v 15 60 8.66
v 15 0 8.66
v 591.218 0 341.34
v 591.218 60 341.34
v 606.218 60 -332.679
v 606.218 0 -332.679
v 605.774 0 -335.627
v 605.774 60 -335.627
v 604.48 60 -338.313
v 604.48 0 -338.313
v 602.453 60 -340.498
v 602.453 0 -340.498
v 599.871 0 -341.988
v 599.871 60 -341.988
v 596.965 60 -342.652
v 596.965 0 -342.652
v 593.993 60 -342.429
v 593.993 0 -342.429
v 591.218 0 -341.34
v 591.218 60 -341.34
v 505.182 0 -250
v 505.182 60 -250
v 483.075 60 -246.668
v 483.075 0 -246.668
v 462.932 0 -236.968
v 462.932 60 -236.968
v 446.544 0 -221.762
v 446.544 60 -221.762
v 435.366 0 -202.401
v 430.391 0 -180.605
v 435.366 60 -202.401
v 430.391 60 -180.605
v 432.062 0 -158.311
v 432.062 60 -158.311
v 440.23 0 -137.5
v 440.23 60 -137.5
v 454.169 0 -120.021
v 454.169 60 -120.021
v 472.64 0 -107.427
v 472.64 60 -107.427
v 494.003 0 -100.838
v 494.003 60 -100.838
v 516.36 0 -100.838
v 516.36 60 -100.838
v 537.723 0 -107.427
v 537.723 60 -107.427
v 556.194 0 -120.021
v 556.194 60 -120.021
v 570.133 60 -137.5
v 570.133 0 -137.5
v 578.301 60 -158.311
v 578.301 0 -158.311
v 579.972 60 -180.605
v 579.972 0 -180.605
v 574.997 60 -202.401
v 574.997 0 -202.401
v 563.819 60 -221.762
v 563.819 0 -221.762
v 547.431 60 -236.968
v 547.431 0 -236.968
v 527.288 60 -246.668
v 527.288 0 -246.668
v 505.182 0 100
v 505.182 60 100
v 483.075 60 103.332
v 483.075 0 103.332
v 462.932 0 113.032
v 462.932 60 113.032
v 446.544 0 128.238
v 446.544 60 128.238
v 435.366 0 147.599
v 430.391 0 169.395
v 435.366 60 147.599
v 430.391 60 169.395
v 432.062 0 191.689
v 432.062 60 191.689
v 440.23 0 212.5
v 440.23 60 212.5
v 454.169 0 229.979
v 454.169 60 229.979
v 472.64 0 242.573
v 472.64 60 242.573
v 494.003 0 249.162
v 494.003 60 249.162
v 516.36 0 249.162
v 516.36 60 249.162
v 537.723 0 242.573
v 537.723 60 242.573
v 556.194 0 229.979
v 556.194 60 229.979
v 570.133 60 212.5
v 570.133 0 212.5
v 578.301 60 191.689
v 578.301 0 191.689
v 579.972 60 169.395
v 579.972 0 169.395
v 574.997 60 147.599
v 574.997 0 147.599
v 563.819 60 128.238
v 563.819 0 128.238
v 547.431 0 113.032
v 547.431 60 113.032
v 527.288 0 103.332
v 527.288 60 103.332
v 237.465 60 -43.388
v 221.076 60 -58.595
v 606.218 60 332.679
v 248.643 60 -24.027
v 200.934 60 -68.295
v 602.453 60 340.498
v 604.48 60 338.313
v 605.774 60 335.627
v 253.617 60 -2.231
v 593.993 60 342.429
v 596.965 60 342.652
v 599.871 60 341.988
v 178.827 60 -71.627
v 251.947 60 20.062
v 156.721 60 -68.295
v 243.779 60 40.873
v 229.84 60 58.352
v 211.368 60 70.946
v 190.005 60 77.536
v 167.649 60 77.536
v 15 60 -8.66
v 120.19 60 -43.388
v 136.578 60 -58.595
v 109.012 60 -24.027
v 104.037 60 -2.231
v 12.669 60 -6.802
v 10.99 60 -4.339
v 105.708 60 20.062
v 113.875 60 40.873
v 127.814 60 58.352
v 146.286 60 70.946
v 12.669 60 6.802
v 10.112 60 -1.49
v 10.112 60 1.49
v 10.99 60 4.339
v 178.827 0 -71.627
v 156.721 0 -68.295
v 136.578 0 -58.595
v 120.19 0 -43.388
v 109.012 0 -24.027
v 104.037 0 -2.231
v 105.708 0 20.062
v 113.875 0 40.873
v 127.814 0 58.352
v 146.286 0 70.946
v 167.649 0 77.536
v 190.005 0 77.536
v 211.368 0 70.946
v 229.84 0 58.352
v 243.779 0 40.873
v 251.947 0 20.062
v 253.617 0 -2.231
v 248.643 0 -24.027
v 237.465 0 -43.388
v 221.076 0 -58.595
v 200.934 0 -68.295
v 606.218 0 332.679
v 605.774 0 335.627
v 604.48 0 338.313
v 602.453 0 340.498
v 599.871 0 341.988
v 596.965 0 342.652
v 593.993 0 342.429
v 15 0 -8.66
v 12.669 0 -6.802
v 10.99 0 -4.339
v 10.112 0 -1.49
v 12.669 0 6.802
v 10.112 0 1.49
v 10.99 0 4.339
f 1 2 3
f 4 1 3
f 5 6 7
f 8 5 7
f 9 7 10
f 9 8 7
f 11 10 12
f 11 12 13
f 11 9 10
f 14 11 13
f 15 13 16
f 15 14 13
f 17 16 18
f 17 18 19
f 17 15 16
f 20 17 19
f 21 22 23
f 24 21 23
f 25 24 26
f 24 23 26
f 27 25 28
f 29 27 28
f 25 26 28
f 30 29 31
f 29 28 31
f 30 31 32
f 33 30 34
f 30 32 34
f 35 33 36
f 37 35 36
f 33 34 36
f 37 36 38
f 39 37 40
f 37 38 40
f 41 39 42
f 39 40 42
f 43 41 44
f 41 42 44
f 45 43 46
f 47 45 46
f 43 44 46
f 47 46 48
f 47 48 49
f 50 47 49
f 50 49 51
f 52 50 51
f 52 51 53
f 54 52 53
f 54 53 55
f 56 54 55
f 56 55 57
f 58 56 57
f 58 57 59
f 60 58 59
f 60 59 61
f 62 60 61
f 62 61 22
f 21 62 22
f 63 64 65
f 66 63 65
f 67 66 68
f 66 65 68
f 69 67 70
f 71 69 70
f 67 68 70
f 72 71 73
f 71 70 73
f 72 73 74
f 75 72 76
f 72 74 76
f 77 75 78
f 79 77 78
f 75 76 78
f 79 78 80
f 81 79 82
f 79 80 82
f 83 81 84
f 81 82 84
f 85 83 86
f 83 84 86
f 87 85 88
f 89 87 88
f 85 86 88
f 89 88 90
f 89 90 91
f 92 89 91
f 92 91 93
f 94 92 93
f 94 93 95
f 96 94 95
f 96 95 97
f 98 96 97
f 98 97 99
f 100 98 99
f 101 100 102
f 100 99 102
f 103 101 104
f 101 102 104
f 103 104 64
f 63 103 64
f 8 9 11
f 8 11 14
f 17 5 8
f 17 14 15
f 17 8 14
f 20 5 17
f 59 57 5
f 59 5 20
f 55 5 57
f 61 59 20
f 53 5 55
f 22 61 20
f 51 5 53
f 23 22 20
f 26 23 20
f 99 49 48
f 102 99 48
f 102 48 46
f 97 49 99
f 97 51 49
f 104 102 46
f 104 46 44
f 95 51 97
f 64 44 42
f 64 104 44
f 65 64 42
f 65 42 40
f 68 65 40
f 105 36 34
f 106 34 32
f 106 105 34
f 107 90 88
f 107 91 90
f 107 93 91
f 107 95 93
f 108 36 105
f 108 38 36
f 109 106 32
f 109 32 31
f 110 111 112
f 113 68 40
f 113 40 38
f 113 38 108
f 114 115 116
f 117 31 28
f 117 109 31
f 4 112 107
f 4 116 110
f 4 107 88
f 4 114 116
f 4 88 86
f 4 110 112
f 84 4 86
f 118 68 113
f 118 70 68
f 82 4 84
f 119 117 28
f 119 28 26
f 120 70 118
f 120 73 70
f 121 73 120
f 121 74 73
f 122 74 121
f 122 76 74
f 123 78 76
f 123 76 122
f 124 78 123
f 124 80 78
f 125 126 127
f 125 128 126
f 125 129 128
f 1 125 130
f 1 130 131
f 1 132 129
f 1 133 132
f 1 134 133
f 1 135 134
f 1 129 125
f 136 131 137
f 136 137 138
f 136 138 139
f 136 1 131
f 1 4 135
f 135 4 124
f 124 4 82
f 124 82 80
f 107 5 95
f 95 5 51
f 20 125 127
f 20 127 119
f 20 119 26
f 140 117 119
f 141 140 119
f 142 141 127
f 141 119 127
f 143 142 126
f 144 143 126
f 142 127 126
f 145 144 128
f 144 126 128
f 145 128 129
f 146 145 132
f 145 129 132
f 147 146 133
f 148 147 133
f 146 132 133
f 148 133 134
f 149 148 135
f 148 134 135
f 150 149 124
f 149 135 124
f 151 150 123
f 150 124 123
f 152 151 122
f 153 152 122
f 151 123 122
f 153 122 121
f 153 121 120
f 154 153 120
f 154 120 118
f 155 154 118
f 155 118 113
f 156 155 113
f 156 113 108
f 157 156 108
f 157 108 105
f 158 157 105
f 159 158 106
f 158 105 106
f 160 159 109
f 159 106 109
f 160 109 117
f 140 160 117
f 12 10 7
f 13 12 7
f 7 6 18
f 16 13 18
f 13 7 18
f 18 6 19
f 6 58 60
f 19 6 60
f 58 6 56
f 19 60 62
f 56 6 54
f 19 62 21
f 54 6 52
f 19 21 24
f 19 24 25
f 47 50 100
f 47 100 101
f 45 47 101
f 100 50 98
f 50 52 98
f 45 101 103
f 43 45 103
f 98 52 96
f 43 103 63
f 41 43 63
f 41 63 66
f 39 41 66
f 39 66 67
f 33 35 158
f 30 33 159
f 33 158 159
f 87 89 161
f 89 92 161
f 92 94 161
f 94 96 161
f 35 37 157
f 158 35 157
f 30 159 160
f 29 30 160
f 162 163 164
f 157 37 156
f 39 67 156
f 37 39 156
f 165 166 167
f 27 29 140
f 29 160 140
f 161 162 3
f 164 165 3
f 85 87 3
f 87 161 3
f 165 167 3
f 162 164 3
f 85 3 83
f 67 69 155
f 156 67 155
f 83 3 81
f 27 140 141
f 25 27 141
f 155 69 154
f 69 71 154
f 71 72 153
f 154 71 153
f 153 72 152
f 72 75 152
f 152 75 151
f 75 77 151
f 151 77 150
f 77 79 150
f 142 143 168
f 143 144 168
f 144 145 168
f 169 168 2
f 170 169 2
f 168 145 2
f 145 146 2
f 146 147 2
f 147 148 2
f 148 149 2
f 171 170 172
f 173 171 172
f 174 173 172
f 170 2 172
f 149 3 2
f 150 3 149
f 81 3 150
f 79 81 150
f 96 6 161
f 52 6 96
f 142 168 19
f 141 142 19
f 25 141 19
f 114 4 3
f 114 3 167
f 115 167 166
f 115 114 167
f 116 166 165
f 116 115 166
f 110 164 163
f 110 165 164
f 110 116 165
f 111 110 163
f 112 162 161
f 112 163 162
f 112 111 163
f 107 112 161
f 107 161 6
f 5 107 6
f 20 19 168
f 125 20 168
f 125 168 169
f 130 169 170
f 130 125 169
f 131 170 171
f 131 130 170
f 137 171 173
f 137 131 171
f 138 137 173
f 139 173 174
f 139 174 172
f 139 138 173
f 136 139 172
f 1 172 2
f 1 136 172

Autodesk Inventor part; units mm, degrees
ref_plane "YZ Plane" through (0, 0, 0) normal (1, 0, 0) x (0, 1, 0)
ref_plane "XZ Plane" through (0, 0, 0) normal (0, 1, 0) x (-1, 0, 0)
ref_plane "XY Plane" through (0, 0, 0) normal (0, 0, 1) x (1, 0, 0)
sketch "Sketch1" plane through (0, 0, 0) normal (0, 1, 0) x (-1, 0, 0)
  line L0 (0.2037, 0) -> (0, 0)
  line L1 (0, 0) -> (-606.2178, 350)
  line L2 (-606.2178, 350) -> (-606.2178, -350)
  line L3 (-606.2178, -350) -> (0, 0)
  point P0 (-178.8272, 3.3733)
  point P1 (-505.1815, 175)
  point P2 (-505.1815, -175)
  dimension "d0" = 700
  dimension "d1" = 700
  dimension "d2" = 700
extrude "Extrusion1" add sketch "Sketch1" along normal blind 60
hole "Hole3" at (505.1815, 0, -175) at (178.8272, 0, 3.3733) at (505.1815, 0, 175) direction (0, 1, 0) diameter 150 end through all
fillet "Fillet1" radius 10 1 edges at (0, 30, 0)
fillet "Fillet2" radius 10 1 edges at (606.2178, 30, 350)
fillet "Fillet3" radius 10 1 edges at (606.2178, 30, -350)
equation "\"d0\" = d1"
equation "\"d1\" = d2"
properties part number "BELLY"
